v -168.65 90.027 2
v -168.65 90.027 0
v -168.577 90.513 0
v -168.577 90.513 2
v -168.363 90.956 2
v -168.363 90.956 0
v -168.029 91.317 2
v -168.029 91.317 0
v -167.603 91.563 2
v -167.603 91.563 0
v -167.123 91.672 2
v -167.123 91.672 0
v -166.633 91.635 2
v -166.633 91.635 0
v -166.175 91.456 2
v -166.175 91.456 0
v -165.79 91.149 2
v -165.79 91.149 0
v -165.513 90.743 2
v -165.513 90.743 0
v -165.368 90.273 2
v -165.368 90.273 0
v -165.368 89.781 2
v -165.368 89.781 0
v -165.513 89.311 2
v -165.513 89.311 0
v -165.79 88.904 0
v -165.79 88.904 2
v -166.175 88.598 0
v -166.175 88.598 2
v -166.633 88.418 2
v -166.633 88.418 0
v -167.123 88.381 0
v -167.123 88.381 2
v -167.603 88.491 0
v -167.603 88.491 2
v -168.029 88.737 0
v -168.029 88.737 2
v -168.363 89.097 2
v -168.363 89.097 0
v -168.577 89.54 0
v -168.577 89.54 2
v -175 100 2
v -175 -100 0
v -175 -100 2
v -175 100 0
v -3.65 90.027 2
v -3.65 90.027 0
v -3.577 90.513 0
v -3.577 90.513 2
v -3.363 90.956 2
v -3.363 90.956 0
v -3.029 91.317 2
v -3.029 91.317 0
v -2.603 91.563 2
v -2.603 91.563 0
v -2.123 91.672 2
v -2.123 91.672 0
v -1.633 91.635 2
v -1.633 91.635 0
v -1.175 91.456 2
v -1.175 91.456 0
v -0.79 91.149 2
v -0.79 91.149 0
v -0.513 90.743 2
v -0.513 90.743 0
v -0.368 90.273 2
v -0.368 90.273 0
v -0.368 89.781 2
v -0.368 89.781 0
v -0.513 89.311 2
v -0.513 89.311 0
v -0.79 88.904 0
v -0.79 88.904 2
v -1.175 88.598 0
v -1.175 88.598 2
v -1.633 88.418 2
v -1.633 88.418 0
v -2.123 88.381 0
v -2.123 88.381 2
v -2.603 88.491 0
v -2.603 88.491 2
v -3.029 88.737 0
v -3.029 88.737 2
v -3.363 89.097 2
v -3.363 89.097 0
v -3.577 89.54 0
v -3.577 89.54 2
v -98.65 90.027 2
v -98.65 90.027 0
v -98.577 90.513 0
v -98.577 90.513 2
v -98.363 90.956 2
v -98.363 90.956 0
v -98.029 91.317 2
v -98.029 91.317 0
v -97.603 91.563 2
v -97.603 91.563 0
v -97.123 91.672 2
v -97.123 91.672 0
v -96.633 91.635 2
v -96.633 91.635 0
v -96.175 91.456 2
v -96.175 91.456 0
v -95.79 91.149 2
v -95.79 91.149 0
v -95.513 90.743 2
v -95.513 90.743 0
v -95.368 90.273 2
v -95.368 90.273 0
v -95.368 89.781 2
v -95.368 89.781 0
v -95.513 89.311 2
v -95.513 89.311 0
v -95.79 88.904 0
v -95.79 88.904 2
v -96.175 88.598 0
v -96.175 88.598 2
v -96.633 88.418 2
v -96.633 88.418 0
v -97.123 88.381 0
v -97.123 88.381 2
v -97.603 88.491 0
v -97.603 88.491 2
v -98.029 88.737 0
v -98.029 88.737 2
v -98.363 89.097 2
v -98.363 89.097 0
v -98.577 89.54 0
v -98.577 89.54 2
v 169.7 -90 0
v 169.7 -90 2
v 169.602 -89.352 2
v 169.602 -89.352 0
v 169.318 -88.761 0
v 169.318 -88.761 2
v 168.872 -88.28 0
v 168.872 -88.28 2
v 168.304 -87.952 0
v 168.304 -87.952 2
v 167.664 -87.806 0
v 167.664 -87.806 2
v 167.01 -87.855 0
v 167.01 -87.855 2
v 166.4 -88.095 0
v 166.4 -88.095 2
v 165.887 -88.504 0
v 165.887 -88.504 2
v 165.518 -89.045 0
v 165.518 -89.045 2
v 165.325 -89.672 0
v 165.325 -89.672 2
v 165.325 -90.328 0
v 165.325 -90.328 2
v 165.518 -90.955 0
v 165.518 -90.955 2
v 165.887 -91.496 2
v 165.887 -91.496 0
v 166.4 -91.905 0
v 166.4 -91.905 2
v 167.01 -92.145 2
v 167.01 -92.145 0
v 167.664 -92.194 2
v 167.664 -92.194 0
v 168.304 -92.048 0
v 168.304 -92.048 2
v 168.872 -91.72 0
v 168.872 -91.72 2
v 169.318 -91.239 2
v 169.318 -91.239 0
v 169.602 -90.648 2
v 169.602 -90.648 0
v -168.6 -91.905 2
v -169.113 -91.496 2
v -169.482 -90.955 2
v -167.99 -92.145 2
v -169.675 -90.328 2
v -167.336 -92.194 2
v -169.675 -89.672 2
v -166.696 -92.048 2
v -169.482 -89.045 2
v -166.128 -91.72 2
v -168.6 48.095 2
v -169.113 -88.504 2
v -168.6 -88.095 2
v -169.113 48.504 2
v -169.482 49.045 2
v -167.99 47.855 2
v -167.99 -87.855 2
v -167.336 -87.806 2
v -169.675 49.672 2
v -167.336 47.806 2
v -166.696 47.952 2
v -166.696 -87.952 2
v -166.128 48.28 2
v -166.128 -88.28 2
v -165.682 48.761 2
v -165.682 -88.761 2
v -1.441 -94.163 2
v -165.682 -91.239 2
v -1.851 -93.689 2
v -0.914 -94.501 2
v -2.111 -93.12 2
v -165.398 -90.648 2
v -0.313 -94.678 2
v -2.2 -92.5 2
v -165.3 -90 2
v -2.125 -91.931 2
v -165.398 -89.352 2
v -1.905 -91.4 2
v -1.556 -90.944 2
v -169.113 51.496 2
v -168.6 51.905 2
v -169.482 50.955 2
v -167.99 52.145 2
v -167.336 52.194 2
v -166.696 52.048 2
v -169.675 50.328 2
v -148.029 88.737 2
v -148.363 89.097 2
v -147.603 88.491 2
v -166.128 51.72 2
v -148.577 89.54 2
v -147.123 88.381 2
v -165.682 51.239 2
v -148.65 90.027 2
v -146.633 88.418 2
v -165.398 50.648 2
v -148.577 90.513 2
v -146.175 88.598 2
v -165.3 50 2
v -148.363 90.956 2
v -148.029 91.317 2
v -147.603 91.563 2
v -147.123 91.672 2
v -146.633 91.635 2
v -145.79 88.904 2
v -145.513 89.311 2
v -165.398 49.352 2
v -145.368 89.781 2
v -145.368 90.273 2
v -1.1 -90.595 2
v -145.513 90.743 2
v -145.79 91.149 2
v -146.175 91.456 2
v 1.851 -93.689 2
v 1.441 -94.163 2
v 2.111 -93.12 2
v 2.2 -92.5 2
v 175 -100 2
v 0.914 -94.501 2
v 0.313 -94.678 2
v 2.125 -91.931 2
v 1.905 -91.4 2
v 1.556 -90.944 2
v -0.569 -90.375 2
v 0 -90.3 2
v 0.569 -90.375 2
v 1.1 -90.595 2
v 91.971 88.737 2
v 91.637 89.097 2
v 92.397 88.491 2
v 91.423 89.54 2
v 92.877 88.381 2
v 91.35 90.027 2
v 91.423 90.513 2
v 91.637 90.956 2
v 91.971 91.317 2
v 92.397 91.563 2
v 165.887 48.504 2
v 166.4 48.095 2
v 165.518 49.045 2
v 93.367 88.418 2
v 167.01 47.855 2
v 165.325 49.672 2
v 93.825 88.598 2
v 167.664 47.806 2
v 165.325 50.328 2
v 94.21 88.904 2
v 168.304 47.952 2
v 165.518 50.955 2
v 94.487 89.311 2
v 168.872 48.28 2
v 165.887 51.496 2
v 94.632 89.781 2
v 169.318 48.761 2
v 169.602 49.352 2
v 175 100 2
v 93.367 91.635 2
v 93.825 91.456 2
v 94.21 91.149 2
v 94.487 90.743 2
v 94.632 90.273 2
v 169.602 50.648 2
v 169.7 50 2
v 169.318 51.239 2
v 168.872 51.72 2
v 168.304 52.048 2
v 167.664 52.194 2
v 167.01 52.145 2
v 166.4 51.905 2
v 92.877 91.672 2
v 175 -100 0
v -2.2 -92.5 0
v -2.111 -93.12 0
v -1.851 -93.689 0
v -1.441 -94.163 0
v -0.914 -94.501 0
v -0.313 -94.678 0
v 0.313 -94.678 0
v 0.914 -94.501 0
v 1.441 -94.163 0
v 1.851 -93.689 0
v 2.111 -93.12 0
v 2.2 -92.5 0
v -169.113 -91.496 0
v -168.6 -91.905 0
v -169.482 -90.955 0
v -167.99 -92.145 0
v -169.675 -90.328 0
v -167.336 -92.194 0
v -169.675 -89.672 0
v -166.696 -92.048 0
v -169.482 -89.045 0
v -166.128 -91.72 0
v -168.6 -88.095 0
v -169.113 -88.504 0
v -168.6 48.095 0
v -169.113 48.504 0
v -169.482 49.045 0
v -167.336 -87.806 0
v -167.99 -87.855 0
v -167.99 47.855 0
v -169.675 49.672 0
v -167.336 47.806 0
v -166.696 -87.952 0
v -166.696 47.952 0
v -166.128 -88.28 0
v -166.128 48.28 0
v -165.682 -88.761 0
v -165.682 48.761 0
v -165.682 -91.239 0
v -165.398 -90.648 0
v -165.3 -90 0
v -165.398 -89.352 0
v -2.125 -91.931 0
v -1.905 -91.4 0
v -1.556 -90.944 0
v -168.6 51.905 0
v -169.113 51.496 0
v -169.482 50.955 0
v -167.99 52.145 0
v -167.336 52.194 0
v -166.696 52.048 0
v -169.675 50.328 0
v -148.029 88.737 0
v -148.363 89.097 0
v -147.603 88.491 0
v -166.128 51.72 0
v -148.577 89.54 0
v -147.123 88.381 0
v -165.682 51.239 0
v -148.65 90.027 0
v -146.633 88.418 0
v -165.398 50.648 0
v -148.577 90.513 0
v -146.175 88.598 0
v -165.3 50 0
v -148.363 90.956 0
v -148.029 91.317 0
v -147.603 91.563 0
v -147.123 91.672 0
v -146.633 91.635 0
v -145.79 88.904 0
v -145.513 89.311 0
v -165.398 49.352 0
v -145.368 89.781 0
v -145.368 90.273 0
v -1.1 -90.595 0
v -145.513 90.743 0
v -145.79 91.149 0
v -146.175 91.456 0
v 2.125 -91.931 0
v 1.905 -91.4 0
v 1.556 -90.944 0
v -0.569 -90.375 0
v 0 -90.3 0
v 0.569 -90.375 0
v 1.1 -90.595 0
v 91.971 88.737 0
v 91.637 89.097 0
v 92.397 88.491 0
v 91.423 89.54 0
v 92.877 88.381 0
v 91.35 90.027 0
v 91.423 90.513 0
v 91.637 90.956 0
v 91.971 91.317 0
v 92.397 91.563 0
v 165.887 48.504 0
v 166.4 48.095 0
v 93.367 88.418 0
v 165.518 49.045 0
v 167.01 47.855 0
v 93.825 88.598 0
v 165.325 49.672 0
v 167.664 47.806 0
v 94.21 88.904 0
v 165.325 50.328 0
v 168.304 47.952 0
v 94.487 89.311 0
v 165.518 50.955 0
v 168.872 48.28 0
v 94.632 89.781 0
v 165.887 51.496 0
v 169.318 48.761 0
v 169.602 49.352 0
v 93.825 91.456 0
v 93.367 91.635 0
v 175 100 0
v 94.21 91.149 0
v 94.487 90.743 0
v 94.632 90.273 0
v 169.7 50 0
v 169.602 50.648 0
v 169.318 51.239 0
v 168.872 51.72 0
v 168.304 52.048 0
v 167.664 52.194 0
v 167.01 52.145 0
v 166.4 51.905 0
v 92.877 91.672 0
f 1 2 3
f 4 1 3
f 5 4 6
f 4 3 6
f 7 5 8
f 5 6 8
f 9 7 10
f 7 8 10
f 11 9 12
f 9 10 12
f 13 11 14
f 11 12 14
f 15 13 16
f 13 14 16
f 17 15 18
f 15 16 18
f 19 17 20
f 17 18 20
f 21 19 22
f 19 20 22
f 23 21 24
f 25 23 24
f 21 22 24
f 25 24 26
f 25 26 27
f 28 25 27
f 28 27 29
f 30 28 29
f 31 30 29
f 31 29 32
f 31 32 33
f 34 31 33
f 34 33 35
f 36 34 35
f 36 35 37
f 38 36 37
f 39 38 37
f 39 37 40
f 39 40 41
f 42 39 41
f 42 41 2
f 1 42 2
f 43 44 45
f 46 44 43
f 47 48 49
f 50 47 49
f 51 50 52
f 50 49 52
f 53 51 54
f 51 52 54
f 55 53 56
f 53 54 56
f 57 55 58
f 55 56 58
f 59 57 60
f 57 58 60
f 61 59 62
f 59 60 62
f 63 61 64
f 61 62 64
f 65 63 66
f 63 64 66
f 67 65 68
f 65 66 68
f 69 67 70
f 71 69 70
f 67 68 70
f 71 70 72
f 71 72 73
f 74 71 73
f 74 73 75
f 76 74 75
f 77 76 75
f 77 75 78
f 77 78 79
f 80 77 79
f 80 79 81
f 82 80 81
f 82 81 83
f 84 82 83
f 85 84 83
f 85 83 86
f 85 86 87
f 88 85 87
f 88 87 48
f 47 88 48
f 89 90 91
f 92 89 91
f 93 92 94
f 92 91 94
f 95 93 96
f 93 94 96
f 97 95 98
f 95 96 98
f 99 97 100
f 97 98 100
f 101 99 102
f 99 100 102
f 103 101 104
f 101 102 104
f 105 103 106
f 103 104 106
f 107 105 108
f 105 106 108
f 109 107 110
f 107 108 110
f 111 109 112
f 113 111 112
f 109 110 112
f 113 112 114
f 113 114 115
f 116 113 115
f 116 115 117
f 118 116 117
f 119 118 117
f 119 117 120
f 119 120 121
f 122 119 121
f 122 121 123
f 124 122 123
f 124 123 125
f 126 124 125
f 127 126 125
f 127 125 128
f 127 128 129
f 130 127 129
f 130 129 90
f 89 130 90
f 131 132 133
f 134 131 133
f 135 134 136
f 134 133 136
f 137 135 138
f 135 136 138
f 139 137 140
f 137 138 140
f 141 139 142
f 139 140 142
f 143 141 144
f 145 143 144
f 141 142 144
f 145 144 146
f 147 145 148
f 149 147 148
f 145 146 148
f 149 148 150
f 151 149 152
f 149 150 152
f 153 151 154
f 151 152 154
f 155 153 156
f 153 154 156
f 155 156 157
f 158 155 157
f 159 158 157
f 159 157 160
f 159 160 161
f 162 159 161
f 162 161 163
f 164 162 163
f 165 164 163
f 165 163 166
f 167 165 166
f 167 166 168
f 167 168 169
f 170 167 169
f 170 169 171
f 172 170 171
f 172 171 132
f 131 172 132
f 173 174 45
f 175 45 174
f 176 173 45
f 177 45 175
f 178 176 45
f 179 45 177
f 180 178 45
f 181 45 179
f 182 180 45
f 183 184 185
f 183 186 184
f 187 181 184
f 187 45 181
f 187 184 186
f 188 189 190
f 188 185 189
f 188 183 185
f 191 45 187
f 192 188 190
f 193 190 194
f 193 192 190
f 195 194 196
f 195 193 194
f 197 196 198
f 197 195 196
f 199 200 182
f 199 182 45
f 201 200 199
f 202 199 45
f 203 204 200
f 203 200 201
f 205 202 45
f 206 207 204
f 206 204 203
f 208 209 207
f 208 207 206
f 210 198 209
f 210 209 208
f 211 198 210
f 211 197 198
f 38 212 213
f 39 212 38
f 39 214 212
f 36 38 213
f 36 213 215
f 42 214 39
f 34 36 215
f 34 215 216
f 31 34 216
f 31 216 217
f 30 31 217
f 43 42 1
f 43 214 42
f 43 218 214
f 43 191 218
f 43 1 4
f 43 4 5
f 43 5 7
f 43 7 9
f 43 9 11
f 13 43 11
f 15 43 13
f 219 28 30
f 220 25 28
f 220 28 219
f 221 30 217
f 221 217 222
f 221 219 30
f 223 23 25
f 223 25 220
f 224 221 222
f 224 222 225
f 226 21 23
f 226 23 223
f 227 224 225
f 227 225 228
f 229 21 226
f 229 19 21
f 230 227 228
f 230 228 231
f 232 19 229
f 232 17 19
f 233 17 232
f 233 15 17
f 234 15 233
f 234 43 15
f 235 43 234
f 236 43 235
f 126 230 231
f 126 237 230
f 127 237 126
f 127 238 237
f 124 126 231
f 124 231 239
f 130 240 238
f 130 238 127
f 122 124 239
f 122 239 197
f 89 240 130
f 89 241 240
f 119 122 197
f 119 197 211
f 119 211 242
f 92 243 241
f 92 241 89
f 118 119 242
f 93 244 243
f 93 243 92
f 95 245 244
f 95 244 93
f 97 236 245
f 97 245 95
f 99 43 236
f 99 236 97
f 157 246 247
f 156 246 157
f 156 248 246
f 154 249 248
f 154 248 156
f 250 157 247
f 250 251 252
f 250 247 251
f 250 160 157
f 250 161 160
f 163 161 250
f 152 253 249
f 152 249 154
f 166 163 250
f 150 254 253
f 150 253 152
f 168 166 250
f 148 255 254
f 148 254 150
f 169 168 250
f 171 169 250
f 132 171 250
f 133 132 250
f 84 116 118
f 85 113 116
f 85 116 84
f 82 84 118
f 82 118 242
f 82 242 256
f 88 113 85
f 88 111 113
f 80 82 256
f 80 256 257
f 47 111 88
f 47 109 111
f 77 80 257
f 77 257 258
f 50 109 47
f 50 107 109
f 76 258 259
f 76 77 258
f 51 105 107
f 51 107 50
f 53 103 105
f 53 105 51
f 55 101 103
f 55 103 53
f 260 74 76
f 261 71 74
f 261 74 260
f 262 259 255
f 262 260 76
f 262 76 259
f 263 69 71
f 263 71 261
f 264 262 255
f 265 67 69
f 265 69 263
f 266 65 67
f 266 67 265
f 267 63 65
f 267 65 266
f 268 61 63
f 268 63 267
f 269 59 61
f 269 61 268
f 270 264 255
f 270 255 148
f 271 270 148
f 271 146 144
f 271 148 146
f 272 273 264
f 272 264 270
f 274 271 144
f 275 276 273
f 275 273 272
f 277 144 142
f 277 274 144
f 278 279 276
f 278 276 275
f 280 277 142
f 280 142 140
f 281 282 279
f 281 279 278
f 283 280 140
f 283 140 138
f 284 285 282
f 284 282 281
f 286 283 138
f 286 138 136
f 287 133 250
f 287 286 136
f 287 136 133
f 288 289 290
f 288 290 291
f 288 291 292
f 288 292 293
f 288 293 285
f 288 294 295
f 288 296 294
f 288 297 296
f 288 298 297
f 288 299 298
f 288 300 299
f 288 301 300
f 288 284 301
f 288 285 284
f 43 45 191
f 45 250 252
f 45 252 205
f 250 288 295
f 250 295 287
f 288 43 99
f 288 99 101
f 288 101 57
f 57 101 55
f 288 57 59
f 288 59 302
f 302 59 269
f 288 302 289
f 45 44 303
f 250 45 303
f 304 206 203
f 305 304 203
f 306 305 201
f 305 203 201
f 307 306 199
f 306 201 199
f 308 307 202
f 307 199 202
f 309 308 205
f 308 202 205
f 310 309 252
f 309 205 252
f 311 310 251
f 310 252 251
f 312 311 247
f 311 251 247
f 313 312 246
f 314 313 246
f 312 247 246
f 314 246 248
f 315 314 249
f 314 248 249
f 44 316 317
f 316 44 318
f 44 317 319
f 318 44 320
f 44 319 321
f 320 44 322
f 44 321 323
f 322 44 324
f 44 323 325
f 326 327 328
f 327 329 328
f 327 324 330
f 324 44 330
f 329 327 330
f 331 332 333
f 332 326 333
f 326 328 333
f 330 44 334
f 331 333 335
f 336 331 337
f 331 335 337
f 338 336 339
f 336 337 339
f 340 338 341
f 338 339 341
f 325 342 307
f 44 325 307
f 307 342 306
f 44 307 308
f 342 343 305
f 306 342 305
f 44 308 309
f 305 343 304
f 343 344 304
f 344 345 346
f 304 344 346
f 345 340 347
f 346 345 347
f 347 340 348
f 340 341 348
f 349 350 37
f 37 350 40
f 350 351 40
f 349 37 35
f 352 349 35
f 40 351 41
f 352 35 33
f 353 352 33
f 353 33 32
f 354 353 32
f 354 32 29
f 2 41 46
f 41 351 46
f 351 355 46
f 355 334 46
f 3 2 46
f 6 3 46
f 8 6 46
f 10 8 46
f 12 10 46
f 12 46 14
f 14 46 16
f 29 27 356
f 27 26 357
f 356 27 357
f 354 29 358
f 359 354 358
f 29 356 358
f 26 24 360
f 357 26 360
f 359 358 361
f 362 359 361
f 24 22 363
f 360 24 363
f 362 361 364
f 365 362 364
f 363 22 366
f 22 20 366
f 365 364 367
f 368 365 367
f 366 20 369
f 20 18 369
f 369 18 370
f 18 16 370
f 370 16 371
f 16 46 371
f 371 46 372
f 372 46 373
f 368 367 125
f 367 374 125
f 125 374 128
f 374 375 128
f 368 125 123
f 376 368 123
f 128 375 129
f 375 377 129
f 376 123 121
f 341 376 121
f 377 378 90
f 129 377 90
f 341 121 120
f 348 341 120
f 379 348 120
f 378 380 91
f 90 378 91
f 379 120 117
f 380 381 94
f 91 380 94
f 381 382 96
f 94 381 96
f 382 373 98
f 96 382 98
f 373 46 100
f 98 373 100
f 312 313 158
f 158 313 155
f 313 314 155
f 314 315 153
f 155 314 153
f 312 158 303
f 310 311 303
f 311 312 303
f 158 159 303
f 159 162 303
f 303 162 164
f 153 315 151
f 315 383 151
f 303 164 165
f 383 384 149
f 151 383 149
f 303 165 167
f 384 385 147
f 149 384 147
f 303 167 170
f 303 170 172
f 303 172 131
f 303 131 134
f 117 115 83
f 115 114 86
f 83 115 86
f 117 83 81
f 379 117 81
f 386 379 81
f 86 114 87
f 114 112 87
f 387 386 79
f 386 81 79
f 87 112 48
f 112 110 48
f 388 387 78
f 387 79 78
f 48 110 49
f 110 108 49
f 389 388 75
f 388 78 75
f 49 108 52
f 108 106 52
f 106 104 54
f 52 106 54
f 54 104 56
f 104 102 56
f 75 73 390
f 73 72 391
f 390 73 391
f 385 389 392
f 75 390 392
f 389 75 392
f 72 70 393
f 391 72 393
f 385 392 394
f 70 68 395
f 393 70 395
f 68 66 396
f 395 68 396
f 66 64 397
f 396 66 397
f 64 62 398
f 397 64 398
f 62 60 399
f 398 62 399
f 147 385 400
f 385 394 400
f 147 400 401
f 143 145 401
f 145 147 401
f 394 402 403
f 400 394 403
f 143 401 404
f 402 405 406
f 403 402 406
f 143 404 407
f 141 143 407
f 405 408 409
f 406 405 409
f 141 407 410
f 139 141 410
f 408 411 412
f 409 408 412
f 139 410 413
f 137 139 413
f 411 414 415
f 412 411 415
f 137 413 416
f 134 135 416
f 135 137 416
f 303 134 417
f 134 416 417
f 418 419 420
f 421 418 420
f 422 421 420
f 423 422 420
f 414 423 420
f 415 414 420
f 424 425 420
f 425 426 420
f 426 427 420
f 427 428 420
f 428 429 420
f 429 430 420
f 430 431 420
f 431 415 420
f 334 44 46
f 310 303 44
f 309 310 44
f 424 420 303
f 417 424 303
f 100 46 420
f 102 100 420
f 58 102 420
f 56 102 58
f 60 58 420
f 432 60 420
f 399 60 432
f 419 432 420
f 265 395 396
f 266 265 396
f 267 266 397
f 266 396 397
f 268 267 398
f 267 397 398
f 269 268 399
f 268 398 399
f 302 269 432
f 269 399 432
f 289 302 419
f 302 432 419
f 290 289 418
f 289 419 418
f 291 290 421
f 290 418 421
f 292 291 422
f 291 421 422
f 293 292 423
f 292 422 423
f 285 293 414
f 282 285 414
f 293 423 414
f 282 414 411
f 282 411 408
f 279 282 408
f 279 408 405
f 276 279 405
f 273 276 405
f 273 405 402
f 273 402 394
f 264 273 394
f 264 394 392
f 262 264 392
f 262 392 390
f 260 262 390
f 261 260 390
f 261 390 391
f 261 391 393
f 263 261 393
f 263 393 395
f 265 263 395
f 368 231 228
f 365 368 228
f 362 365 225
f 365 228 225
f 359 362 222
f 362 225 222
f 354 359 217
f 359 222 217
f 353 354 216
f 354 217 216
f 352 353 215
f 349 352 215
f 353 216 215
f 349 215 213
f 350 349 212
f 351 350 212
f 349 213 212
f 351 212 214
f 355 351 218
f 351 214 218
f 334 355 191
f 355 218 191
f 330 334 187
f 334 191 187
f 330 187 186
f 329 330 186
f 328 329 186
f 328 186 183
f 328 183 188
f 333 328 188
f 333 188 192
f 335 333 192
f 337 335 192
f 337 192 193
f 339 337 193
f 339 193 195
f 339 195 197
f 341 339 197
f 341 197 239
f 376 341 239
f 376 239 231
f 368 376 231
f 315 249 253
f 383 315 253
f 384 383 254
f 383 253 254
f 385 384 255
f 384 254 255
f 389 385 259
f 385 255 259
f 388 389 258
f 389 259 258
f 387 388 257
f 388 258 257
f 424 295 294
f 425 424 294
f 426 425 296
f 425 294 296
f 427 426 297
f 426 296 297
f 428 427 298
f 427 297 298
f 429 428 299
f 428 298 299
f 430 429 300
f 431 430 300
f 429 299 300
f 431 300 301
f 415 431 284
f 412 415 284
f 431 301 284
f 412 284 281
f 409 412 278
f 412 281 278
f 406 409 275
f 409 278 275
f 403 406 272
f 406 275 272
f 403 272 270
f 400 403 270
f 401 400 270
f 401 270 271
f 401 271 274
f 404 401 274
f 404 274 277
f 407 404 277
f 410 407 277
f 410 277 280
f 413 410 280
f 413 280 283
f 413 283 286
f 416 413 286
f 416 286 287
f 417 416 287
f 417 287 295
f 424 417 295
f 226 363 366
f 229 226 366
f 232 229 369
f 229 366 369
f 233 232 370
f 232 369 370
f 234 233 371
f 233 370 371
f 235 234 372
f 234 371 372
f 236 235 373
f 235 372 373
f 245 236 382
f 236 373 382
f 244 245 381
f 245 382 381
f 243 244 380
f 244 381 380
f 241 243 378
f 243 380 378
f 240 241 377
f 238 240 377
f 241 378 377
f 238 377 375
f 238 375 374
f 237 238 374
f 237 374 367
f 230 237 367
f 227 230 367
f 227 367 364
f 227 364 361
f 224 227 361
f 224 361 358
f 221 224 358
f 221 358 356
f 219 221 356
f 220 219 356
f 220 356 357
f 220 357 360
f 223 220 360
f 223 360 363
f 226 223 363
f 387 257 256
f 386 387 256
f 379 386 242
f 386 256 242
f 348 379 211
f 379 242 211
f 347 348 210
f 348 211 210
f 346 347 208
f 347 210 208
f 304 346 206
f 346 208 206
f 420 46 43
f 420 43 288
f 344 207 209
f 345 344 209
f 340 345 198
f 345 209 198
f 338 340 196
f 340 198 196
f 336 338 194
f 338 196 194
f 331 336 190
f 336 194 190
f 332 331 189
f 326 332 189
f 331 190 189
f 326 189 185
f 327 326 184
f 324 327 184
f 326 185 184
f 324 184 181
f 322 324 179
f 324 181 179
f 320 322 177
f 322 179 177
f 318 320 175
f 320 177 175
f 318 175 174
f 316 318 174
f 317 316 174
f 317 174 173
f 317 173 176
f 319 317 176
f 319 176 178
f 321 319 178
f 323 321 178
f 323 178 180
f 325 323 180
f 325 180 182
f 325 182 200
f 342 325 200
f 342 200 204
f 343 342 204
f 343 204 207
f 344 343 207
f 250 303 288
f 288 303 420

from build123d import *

# Parameters (mm, degrees)
SKETCH_1_W          = 350
SKETCH_1_H          = 200
EXTRUDE_1_DEPTH     = 2
SKETCH_3_R          = 2.2
CUT_EXTRUDE_2_DEPTH = 160
CUT_EXTRUDE_3_DEPTH = 160
SKETCH_9_R          = 1.092195423
SKETCH_9_R_2        = 1.081161574
SKETCH_9_R_3        = 1.093650915
CUT_EXTRUDE_6_DEPTH = 10
M4X0_7_3_D          = 3.3
SKETCH_12_R         = 1.094790711
SKETCH_12_R_2       = 0.646819846
CUT_EXTRUDE_7_DEPTH = 10
M4X0_7_4_D          = 3.3


with BuildPart() as part:
    # ｽｹｯﾁ1 → ﾎﾞｽ - 押し出し1 (new body)
    with BuildSketch(Plane.XY):
        Rectangle(SKETCH_1_W, SKETCH_1_H)
    extrude(amount=EXTRUDE_1_DEPTH)

    # ｽｹｯﾁ3 → ｶｯﾄ - 押し出し2 (cut)
    with BuildSketch(Plane.XY.offset(2)):
        with Locations((-167.5, 50)):
            Circle(SKETCH_3_R)
        with Locations((-167.5, -90)):
            Circle(SKETCH_3_R)
        with Locations((167.5, -90)):
            Circle(SKETCH_3_R)
        with Locations((167.5, 50)):
            Circle(SKETCH_3_R)
    extrude(amount=-CUT_EXTRUDE_2_DEPTH, mode=Mode.SUBTRACT)

    # ｽｹｯﾁ4 → ｶｯﾄ - 押し出し3 (cut)
    with BuildSketch(Plane.XY.offset(2)):
        with BuildLine():
            Line((0, -92.5), (-2.2, -92.5))
            ThreePointArc((-2.2, -92.5), (0, -94.7), (2.2, -92.5))
            Line((2.2, -92.5), (0, -92.5))
        make_face()
        with BuildLine():
            ThreePointArc((0, -90.3), (-1.555634919, -90.944365081), (-2.2, -92.5))
            Line((-2.2, -92.5), (0, -92.5))
            Line((0, -92.5), (0, -90.3))
        make_face()
        with BuildLine():
            Line((0, -90.3), (0, -92.5))
            Line((0, -92.5), (2.2, -92.5))
            ThreePointArc((2.2, -92.5), (1.555634919, -90.944365081), (0, -90.3))
        make_face()
    extrude(amount=-CUT_EXTRUDE_3_DEPTH, mode=Mode.SUBTRACT)

    # ｽｹｯﾁ9 → ｶｯﾄ - 押し出し6 (cut)
    with BuildSketch(Plane.XY.offset(2)):
        with Locations((-97, 90.026666535)):
            Circle(SKETCH_9_R)
        with Locations((-2, 90.026666535)):
            Circle(SKETCH_9_R_2)
        with Locations((93, 90.026666535)):
            Circle(SKETCH_9_R_3)
    extrude(amount=-CUT_EXTRUDE_6_DEPTH, mode=Mode.SUBTRACT)

    # M4x0.7 ねじ穴3 (through all)
    with Locations(Plane(origin=(93, 90.026666535, 2), x_dir=(1, 0, 0), z_dir=(0, 0, 1))):
        with Locations((0, 0), (-95, 0), (-190, 0)):
            Hole(M4X0_7_3_D / 2)

    # ｽｹｯﾁ12 → ｶｯﾄ - 押し出し7 (cut)
    with BuildSketch(Plane.XY.offset(2)):
        with Locations((-147, 90.026666535)):
            Circle(SKETCH_12_R)
        with Locations((-167, 90.026666535)):
            Circle(SKETCH_12_R_2)
    extrude(amount=-CUT_EXTRUDE_7_DEPTH, mode=Mode.SUBTRACT)

    # M4x0.7 ねじ穴4 (through all)
    with Locations(Plane(origin=(-147, 90.026666535, 2), x_dir=(1, 0, 0), z_dir=(0, 0, 1))):
        with Locations((0, 0), (-20, 0)):
            Hole(M4X0_7_4_D / 2)


solid = part.part
